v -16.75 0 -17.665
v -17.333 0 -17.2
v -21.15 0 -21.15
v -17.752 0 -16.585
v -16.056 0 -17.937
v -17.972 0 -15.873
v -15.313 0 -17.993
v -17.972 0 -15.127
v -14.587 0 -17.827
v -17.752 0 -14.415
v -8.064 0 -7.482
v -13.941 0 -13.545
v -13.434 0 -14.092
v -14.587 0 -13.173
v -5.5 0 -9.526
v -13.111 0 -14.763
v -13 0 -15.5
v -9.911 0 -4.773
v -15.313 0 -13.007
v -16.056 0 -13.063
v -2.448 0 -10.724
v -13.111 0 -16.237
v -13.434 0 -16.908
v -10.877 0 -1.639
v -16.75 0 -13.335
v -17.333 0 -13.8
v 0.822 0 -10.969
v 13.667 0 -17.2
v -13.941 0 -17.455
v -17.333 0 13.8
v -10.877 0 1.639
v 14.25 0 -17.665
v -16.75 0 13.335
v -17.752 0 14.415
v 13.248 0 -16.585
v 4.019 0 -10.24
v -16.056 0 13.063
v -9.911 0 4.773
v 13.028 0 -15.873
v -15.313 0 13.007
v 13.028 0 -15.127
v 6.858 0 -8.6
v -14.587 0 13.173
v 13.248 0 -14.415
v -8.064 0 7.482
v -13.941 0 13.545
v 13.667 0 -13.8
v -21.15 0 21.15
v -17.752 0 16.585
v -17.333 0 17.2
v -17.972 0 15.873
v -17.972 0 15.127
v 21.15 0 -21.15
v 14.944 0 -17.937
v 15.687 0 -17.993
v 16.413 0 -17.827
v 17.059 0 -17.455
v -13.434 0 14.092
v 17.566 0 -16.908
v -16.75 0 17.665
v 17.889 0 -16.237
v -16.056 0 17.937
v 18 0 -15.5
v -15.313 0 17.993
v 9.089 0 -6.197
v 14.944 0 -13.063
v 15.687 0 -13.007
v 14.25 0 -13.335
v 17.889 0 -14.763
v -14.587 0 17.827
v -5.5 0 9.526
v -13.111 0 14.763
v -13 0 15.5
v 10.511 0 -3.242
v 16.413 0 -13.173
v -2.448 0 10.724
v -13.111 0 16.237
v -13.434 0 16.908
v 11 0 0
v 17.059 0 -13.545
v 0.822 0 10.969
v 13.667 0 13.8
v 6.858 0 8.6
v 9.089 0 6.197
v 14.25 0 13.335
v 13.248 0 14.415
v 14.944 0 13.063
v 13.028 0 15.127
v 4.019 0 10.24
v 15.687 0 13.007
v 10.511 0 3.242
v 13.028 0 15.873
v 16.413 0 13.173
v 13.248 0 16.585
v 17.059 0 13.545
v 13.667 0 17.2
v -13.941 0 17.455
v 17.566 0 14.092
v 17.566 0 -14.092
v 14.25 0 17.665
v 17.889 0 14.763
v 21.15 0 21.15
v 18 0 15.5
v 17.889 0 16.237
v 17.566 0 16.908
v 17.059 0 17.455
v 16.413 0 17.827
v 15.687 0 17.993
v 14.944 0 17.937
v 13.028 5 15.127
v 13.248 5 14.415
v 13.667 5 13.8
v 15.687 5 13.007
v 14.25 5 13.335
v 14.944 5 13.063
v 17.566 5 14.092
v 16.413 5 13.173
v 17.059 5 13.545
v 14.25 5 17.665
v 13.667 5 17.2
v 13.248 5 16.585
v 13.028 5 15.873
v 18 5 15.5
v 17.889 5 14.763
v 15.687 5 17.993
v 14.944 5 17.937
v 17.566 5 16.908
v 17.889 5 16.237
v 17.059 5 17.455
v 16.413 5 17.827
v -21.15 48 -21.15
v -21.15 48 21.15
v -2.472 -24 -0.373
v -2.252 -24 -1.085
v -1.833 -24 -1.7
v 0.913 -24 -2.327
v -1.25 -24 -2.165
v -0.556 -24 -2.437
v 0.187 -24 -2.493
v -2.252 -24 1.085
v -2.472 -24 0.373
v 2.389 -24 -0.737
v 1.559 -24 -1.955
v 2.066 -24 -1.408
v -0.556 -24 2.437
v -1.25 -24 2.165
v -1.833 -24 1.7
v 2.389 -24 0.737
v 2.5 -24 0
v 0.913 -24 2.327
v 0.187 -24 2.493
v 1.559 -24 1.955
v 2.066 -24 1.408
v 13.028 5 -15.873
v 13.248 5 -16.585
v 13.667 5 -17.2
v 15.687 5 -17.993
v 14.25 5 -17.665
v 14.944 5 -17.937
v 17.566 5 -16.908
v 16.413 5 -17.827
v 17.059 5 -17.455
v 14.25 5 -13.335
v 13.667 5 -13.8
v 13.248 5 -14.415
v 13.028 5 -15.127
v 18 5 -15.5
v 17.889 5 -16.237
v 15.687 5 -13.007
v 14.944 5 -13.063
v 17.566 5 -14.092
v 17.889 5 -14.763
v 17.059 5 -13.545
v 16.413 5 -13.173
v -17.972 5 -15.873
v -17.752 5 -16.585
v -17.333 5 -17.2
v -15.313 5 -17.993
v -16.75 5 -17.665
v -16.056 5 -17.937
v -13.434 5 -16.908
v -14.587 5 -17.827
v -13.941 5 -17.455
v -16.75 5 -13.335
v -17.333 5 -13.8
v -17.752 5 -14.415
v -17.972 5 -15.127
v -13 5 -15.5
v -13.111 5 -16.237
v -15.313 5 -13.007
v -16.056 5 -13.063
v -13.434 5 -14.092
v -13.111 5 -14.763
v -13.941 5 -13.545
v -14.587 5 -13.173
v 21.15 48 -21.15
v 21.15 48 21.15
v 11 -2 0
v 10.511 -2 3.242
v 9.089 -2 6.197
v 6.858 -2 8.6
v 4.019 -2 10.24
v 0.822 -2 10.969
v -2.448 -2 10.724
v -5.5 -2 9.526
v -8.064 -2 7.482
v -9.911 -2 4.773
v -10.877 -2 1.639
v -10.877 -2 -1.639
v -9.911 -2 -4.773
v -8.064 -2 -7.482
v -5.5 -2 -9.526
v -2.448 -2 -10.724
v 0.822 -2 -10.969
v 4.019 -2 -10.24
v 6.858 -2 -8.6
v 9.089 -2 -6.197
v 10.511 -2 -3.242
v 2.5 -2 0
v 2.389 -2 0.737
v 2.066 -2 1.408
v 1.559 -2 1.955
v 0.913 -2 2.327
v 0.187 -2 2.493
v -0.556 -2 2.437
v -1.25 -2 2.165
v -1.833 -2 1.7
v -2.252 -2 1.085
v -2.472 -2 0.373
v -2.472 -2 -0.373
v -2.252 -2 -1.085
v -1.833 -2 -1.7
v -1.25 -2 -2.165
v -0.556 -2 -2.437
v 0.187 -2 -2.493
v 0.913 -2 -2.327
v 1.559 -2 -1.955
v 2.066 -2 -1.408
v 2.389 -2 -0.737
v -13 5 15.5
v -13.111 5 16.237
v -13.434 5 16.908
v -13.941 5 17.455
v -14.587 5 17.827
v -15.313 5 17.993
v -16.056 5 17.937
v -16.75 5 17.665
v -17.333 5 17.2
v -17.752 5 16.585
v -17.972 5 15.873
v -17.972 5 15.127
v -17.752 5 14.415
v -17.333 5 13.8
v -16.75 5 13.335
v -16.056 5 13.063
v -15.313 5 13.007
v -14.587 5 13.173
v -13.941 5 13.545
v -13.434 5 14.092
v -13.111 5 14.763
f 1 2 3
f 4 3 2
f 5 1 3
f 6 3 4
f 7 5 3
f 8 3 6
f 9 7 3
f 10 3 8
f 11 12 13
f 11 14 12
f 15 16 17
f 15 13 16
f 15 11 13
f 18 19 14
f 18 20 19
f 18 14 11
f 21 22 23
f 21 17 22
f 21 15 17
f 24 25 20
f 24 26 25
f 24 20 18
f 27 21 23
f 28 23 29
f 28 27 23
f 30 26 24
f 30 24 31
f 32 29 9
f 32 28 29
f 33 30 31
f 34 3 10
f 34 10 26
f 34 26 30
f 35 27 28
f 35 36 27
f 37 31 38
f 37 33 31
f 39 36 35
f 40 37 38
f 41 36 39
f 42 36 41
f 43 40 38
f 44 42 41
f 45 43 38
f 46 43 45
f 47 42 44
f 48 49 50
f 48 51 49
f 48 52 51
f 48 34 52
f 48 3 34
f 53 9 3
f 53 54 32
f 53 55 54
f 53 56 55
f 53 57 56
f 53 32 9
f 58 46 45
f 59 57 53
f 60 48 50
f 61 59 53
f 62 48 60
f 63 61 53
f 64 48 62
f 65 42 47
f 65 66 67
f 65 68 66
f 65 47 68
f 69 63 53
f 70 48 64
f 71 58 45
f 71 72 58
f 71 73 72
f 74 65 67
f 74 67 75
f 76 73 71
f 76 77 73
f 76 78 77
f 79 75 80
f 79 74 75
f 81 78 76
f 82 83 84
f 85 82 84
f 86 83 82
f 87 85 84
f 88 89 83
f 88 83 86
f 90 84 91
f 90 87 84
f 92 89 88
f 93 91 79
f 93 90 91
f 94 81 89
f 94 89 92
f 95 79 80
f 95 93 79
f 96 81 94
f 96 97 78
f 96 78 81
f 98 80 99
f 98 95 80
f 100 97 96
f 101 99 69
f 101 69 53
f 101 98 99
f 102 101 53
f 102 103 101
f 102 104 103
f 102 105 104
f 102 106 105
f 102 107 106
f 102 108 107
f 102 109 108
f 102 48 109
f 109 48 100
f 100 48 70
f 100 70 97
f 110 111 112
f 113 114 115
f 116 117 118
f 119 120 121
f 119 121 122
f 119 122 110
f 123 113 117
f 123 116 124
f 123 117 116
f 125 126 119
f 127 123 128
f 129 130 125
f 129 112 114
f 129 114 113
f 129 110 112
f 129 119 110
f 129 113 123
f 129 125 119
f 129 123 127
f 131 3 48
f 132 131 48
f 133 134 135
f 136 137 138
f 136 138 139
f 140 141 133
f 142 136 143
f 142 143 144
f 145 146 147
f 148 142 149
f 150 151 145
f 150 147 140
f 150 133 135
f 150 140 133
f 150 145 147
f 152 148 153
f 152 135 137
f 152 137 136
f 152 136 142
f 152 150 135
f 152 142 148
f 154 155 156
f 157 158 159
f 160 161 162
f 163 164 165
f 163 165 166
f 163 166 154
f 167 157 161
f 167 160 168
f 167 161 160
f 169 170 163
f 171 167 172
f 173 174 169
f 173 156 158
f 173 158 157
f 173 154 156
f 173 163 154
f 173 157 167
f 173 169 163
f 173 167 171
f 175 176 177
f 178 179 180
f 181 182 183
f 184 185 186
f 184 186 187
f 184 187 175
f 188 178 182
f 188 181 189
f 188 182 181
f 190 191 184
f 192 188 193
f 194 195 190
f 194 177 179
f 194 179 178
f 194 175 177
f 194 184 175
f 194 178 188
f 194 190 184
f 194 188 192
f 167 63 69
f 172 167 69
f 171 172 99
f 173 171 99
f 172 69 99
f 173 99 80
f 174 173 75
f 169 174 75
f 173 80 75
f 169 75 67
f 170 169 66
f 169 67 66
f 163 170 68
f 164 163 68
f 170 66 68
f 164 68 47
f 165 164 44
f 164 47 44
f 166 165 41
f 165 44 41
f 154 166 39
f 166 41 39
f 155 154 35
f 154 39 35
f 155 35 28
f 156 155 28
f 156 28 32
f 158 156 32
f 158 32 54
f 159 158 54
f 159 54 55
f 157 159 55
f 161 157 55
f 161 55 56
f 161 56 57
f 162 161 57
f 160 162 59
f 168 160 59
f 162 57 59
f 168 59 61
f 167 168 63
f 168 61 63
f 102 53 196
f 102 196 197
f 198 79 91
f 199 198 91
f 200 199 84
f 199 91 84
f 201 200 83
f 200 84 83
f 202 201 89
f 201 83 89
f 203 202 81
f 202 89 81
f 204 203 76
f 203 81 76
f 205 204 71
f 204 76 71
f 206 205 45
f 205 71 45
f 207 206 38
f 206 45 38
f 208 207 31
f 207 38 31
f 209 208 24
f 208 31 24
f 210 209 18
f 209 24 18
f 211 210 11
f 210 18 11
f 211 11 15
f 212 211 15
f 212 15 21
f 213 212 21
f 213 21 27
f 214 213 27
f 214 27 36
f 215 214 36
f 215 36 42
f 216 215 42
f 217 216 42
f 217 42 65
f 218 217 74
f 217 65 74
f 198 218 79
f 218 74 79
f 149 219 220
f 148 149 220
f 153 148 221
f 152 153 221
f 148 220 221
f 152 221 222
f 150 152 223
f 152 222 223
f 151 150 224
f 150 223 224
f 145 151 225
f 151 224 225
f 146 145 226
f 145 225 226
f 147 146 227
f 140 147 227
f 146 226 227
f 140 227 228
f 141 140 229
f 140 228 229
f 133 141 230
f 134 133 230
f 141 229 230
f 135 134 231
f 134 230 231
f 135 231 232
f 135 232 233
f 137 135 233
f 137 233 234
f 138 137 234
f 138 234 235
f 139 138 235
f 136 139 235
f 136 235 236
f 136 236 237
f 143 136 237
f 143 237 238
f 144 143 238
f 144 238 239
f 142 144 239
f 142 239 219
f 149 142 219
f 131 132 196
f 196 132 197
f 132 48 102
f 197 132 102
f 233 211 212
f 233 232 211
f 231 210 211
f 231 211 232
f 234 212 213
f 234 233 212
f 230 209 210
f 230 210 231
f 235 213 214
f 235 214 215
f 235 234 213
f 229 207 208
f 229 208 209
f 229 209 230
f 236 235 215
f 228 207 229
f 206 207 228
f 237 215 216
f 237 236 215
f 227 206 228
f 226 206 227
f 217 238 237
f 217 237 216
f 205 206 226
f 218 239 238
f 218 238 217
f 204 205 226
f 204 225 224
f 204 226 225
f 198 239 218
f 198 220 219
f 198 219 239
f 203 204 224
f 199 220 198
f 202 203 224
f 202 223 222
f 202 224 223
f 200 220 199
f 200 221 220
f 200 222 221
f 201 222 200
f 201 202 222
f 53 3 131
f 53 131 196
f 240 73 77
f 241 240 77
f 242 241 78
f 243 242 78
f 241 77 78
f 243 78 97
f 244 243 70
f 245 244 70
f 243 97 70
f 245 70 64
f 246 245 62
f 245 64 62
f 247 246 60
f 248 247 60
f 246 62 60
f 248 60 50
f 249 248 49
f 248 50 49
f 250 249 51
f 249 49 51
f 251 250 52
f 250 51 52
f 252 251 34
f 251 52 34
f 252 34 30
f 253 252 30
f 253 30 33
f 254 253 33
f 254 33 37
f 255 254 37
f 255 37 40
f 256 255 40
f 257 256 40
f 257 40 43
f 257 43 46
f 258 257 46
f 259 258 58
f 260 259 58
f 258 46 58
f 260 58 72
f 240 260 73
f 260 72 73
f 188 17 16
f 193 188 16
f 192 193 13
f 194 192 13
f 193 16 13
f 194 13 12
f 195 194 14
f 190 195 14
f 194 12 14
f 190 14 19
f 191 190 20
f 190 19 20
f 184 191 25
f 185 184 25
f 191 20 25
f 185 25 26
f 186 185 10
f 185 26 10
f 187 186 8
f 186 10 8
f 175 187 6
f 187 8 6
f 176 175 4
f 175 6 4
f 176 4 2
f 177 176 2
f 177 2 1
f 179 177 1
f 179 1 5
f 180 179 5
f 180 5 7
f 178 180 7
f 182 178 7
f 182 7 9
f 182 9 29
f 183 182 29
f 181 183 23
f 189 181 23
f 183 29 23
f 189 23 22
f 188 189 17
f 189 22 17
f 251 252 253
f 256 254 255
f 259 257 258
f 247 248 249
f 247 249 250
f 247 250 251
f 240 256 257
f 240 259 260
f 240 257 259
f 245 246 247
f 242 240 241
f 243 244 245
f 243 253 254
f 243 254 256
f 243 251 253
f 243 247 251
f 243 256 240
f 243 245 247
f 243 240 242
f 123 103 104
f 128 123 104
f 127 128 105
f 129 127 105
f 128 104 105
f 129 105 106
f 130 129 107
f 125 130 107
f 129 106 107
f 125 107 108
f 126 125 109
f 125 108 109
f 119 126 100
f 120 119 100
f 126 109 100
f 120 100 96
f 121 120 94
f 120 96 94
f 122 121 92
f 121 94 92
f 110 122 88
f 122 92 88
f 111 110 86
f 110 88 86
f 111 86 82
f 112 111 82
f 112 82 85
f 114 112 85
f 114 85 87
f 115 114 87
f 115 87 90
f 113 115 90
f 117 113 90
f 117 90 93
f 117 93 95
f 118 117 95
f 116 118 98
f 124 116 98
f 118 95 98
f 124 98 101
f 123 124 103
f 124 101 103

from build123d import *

# Parameters (mm, degrees)
F0_W     = 42.3
F0_H     = 42.3
F0_R     = 2.5
F0_R_2   = 11
F1_DEPTH = 48
F2_DEPTH = 5
F3_DEPTH = 2
F4_DEPTH = 24


with BuildPart() as f1:
    # F0 (on Front) → F1 (new body)
    with BuildSketch(Plane.XZ):
        Rectangle(F0_W, F0_H)
        with Locations((-15.5, -15.5)):
            Circle(F0_R, mode=Mode.SUBTRACT)
        with Locations((15.5, -15.5)):
            Circle(F0_R, mode=Mode.SUBTRACT)
        with Locations((-15.5, 15.5)):
            Circle(F0_R, mode=Mode.SUBTRACT)
        Circle(F0_R_2, mode=Mode.SUBTRACT)
        with Locations((15.5, 15.5)):
            Circle(F0_R, mode=Mode.SUBTRACT)
        Circle(F0_R_2)
        Circle(F0_R, mode=Mode.SUBTRACT)
        with Locations((-15.5, 15.5)):
            Circle(F0_R)
        Circle(F0_R)
        with Locations((15.5, 15.5)):
            Circle(F0_R)
        with Locations((-15.5, -15.5)):
            Circle(F0_R)
        with Locations((15.5, -15.5)):
            Circle(F0_R)
    extrude(amount=-F1_DEPTH)

    # F0 (on Front) → F2 (cut)
    with BuildSketch(Plane.XZ):
        with Locations((-15.5, 15.5)):
            Circle(F0_R)
        with Locations((15.5, 15.5)):
            Circle(F0_R)
        with Locations((15.5, -15.5)):
            Circle(F0_R)
        with Locations((-15.5, -15.5)):
            Circle(F0_R)
    extrude(amount=-F2_DEPTH, mode=Mode.SUBTRACT)

    # F0 (on Front) → F3 (join)
    with BuildSketch(Plane.XZ):
        Circle(F0_R_2)
        Circle(F0_R, mode=Mode.SUBTRACT)
    extrude(amount=F3_DEPTH)

    # F0 (on Front) → F4 (join)
    with BuildSketch(Plane.XZ):
        Circle(F0_R)
    extrude(amount=F4_DEPTH)


solid = f1.part
